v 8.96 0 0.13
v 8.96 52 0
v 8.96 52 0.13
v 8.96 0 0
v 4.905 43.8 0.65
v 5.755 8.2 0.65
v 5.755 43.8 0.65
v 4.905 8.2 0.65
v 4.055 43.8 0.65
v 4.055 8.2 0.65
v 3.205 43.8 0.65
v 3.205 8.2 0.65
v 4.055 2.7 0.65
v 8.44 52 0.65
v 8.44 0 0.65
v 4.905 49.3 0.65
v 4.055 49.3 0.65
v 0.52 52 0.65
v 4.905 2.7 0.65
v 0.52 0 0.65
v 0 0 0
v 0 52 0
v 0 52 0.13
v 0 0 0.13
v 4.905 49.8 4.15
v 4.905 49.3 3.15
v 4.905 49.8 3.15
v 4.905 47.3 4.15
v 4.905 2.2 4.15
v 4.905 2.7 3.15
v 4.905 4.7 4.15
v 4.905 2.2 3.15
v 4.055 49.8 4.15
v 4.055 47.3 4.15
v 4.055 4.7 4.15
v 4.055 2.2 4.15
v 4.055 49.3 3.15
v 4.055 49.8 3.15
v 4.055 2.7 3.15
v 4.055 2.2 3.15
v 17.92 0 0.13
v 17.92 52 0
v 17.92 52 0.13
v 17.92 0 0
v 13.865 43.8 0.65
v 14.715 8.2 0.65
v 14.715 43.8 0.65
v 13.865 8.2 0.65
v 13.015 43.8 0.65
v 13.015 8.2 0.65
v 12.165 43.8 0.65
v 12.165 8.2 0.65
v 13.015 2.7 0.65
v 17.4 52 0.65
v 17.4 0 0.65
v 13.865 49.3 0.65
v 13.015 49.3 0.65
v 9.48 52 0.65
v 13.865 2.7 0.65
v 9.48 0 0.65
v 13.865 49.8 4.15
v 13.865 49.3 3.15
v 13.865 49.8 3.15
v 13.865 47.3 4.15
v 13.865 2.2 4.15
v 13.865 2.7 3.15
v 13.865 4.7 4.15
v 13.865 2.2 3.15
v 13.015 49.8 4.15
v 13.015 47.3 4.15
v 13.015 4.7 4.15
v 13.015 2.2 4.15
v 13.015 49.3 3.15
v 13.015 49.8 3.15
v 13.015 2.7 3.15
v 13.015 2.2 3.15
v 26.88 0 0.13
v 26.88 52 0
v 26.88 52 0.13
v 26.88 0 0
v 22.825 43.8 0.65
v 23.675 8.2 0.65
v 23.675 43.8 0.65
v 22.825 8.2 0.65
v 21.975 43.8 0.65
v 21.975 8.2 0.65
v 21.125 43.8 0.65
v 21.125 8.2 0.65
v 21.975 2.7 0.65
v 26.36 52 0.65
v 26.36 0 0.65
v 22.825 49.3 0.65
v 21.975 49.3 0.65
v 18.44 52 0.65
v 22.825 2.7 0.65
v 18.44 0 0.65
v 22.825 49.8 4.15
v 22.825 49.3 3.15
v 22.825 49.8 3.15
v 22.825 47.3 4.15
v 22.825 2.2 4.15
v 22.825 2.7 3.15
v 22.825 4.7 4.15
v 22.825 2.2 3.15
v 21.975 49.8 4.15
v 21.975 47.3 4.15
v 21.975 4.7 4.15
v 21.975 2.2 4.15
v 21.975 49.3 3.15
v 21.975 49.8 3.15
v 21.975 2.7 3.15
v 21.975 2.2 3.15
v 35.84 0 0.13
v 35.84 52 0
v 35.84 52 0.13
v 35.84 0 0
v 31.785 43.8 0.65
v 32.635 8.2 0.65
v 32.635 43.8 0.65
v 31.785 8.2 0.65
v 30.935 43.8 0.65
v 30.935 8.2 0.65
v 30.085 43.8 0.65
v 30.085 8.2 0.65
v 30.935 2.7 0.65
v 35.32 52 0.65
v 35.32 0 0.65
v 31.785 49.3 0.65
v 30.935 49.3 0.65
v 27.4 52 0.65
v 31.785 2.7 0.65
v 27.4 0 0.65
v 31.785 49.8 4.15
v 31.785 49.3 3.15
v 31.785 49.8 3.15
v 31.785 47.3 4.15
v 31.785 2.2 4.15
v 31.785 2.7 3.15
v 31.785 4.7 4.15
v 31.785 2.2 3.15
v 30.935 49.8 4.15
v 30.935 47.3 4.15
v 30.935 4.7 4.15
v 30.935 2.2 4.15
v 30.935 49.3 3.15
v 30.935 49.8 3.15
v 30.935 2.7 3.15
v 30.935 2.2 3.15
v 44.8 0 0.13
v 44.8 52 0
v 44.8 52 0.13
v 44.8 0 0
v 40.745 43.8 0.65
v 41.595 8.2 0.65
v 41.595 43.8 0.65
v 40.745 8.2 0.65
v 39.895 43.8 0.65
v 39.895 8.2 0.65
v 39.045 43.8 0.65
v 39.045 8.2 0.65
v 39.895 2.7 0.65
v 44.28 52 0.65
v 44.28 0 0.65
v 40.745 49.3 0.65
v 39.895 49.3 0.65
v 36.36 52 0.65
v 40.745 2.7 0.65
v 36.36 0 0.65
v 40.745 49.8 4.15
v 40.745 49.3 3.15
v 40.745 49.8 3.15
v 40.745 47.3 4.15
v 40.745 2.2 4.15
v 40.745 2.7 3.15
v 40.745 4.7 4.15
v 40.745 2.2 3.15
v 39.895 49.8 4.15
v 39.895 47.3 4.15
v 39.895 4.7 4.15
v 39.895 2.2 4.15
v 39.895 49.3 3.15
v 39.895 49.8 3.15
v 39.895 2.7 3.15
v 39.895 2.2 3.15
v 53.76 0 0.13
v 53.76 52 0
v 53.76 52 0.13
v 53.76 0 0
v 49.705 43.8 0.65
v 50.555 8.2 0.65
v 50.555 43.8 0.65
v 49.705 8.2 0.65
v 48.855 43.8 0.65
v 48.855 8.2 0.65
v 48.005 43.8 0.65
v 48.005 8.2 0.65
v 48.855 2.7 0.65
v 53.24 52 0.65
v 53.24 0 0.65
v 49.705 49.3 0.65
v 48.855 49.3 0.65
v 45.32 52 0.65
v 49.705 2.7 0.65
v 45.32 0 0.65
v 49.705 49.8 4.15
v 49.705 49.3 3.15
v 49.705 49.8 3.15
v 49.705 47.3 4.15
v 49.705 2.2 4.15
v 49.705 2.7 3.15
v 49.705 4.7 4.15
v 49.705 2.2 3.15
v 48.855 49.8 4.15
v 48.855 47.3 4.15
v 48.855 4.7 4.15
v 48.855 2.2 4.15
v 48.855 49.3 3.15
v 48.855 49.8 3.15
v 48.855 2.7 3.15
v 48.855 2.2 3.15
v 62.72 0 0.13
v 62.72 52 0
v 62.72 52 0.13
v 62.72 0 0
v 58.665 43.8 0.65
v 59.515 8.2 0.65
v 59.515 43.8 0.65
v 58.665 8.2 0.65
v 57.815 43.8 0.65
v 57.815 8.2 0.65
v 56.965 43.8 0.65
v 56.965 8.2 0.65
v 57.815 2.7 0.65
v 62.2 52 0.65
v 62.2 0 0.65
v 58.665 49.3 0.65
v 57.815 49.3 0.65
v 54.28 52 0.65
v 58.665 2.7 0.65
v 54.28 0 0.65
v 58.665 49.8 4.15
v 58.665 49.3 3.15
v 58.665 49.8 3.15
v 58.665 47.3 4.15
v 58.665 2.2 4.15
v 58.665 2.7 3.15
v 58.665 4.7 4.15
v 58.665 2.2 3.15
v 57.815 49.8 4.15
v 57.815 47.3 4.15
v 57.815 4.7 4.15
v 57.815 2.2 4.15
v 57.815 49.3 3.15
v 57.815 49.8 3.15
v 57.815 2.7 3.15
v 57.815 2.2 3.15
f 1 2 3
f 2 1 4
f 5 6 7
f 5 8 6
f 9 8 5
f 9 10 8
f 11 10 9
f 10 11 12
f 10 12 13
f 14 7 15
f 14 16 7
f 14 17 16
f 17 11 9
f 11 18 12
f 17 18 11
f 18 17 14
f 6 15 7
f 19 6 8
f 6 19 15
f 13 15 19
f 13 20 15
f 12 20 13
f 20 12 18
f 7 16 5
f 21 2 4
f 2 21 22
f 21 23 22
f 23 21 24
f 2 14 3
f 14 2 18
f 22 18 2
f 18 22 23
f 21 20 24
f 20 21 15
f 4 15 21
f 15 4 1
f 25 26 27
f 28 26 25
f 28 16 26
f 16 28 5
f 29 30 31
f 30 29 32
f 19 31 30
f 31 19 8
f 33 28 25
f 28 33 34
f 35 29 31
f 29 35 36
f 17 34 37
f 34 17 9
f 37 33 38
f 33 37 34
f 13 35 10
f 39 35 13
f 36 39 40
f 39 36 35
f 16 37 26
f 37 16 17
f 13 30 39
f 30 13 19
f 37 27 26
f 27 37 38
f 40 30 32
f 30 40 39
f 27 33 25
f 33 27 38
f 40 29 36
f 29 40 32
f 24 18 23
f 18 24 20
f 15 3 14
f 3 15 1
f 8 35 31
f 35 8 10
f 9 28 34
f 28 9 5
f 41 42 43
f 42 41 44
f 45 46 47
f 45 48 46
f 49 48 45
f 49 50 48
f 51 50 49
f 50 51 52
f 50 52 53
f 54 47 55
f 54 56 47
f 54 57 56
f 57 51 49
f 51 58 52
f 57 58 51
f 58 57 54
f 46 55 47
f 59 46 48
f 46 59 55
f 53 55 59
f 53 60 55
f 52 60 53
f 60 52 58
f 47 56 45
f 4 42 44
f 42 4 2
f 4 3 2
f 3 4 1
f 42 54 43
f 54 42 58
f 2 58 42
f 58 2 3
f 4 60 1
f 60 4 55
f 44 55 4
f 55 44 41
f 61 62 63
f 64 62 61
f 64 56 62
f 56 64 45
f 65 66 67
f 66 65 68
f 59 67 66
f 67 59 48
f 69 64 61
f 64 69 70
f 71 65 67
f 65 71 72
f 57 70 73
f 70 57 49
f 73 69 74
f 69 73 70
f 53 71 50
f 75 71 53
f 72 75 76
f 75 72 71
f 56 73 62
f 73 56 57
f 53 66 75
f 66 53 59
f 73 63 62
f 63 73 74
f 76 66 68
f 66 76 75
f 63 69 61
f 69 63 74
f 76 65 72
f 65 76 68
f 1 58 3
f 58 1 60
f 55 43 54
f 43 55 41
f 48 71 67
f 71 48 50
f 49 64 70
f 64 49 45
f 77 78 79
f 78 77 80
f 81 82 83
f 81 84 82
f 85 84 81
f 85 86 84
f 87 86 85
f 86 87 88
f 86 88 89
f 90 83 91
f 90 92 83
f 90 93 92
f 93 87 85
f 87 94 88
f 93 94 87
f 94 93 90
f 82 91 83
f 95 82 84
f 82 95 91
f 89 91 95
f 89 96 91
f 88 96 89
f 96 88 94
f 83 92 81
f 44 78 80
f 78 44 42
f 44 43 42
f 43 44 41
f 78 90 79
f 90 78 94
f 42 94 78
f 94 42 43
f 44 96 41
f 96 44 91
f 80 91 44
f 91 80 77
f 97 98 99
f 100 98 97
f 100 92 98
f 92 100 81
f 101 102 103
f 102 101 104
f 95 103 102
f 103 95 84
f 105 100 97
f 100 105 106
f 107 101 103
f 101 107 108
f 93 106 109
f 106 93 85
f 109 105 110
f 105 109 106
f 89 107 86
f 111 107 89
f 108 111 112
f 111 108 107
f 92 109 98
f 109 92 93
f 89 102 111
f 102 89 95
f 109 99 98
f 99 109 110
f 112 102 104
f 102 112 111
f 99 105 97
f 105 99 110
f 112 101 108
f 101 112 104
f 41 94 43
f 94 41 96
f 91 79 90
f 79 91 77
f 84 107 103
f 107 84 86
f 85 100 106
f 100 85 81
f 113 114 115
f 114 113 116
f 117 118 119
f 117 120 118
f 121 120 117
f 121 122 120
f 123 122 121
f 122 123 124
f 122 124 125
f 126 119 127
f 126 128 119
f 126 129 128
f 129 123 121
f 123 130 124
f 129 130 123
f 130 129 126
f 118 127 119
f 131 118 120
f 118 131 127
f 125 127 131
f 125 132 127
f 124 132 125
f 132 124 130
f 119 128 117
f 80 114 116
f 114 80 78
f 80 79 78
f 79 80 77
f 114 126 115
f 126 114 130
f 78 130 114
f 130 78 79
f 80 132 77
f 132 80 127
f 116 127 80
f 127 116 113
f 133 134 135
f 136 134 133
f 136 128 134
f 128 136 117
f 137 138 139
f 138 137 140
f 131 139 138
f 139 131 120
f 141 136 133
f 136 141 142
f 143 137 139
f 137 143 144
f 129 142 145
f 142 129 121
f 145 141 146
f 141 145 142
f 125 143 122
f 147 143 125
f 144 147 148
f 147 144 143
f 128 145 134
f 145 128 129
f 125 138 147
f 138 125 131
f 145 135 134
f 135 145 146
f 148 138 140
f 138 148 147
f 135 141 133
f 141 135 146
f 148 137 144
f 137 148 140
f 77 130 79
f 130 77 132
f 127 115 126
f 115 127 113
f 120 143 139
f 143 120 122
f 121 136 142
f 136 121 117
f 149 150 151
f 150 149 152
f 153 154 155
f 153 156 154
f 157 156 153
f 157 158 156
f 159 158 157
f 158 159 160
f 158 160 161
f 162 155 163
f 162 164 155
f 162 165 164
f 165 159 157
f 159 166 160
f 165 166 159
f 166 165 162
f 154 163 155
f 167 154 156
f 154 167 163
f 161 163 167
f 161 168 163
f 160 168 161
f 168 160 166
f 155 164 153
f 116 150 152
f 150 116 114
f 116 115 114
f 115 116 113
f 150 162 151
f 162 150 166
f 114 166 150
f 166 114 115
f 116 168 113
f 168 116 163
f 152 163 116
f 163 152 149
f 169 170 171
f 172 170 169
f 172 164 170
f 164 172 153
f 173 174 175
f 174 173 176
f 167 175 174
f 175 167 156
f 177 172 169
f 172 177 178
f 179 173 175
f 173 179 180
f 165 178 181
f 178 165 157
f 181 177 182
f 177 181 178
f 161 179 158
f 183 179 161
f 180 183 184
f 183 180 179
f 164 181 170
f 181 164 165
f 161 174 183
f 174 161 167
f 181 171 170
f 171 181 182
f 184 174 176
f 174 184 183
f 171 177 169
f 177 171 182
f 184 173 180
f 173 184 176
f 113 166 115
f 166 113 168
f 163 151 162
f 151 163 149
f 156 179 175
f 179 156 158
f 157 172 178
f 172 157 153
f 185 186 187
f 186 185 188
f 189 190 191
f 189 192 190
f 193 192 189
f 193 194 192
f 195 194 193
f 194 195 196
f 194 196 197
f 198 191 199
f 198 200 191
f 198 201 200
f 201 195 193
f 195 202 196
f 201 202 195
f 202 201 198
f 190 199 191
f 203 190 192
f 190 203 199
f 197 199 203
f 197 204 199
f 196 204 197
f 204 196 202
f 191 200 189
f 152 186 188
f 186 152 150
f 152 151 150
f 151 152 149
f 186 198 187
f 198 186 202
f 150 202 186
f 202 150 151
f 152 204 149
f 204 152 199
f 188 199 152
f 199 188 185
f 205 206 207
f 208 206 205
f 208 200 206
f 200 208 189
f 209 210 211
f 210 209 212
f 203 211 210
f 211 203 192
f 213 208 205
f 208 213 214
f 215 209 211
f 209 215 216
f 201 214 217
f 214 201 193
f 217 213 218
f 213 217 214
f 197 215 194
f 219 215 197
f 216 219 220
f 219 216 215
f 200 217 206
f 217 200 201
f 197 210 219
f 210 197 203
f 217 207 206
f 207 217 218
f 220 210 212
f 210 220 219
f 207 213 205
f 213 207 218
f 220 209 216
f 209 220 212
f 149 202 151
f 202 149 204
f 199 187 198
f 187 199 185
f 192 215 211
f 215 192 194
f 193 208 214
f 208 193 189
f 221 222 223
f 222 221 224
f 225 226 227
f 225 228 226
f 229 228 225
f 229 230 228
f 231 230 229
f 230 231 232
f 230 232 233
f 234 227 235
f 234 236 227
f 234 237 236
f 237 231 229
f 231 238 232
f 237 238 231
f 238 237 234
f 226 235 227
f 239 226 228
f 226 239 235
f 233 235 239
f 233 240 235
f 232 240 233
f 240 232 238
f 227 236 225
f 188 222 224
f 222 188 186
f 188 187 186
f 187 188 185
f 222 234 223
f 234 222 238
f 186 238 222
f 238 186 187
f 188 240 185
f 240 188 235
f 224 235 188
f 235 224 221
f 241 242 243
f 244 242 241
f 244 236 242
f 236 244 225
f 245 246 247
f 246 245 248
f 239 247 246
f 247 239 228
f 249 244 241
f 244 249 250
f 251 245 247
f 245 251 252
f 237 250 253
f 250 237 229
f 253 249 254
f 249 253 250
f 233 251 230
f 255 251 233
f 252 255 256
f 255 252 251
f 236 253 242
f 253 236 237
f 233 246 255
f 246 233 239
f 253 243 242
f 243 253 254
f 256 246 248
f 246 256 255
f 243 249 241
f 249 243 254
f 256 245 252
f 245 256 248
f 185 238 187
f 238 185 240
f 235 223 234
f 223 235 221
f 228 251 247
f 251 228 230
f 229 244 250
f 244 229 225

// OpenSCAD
/* 
**
** Cache boitier DIN
**
** 0.3; 0.35
** 100%; rectilinear; fill angle = 0
** filament diametre = 2.2
** 210; 210
** 75; 55
*/

wElem = 8.96;  // 8.74 auparavant
               // 1 module = 17,9 mm
hElem = 52;
hHole = 46.6;
eElem = 0.65;
wRay = 0.85;
hRay = 3.5;
hTop = 2;
grip = 0.5;
eCase = 2.5;

// Appel de la fonction principale, en indiquant le nombre d'éléments
cacheDIN(7);


module cacheDIN(nElem) {
  x = (hElem-hHole)/2+hTop+hRay;
  m = (wElem-wRay)/2-wRay;
  for (n = [0 : nElem-1]) {
    translate([n*wElem, 0, 0]) difference() {
      union() {
        // plaque de base
        cube([wElem, hElem, eElem]);
        // arrête de maintient
        translate([(wElem-wRay)/2, (hElem-hHole)/2, eElem]) cube([wRay, hHole, hRay]);
        translate([(wElem-wRay)/2, (hElem-hHole)/2-grip, eElem+eCase]) cube([wRay, hHole+grip*2, hRay-eCase]);
      }
      union() {
        for (i = [0, 1]) {
          translate([i*wElem, 0, eElem*1.2]) rotate([-90, 0, 0]) cylinder(d=eElem*2, h=hElem, $fn=4);
        }
        // creux dans l'arrête de maintient
        hull() {  
          translate([m, x, hRay+eElem]) rotate([0, 90, 0]) cylinder(d=hRay*2, h=wRay*3, $fn=4);
          translate([m, hElem-x, hRay+eElem]) rotate([0, 90, 0]) cylinder(d=hRay*2, h=wRay*3, $fn=4);
        }
      }
    }
  }
}
